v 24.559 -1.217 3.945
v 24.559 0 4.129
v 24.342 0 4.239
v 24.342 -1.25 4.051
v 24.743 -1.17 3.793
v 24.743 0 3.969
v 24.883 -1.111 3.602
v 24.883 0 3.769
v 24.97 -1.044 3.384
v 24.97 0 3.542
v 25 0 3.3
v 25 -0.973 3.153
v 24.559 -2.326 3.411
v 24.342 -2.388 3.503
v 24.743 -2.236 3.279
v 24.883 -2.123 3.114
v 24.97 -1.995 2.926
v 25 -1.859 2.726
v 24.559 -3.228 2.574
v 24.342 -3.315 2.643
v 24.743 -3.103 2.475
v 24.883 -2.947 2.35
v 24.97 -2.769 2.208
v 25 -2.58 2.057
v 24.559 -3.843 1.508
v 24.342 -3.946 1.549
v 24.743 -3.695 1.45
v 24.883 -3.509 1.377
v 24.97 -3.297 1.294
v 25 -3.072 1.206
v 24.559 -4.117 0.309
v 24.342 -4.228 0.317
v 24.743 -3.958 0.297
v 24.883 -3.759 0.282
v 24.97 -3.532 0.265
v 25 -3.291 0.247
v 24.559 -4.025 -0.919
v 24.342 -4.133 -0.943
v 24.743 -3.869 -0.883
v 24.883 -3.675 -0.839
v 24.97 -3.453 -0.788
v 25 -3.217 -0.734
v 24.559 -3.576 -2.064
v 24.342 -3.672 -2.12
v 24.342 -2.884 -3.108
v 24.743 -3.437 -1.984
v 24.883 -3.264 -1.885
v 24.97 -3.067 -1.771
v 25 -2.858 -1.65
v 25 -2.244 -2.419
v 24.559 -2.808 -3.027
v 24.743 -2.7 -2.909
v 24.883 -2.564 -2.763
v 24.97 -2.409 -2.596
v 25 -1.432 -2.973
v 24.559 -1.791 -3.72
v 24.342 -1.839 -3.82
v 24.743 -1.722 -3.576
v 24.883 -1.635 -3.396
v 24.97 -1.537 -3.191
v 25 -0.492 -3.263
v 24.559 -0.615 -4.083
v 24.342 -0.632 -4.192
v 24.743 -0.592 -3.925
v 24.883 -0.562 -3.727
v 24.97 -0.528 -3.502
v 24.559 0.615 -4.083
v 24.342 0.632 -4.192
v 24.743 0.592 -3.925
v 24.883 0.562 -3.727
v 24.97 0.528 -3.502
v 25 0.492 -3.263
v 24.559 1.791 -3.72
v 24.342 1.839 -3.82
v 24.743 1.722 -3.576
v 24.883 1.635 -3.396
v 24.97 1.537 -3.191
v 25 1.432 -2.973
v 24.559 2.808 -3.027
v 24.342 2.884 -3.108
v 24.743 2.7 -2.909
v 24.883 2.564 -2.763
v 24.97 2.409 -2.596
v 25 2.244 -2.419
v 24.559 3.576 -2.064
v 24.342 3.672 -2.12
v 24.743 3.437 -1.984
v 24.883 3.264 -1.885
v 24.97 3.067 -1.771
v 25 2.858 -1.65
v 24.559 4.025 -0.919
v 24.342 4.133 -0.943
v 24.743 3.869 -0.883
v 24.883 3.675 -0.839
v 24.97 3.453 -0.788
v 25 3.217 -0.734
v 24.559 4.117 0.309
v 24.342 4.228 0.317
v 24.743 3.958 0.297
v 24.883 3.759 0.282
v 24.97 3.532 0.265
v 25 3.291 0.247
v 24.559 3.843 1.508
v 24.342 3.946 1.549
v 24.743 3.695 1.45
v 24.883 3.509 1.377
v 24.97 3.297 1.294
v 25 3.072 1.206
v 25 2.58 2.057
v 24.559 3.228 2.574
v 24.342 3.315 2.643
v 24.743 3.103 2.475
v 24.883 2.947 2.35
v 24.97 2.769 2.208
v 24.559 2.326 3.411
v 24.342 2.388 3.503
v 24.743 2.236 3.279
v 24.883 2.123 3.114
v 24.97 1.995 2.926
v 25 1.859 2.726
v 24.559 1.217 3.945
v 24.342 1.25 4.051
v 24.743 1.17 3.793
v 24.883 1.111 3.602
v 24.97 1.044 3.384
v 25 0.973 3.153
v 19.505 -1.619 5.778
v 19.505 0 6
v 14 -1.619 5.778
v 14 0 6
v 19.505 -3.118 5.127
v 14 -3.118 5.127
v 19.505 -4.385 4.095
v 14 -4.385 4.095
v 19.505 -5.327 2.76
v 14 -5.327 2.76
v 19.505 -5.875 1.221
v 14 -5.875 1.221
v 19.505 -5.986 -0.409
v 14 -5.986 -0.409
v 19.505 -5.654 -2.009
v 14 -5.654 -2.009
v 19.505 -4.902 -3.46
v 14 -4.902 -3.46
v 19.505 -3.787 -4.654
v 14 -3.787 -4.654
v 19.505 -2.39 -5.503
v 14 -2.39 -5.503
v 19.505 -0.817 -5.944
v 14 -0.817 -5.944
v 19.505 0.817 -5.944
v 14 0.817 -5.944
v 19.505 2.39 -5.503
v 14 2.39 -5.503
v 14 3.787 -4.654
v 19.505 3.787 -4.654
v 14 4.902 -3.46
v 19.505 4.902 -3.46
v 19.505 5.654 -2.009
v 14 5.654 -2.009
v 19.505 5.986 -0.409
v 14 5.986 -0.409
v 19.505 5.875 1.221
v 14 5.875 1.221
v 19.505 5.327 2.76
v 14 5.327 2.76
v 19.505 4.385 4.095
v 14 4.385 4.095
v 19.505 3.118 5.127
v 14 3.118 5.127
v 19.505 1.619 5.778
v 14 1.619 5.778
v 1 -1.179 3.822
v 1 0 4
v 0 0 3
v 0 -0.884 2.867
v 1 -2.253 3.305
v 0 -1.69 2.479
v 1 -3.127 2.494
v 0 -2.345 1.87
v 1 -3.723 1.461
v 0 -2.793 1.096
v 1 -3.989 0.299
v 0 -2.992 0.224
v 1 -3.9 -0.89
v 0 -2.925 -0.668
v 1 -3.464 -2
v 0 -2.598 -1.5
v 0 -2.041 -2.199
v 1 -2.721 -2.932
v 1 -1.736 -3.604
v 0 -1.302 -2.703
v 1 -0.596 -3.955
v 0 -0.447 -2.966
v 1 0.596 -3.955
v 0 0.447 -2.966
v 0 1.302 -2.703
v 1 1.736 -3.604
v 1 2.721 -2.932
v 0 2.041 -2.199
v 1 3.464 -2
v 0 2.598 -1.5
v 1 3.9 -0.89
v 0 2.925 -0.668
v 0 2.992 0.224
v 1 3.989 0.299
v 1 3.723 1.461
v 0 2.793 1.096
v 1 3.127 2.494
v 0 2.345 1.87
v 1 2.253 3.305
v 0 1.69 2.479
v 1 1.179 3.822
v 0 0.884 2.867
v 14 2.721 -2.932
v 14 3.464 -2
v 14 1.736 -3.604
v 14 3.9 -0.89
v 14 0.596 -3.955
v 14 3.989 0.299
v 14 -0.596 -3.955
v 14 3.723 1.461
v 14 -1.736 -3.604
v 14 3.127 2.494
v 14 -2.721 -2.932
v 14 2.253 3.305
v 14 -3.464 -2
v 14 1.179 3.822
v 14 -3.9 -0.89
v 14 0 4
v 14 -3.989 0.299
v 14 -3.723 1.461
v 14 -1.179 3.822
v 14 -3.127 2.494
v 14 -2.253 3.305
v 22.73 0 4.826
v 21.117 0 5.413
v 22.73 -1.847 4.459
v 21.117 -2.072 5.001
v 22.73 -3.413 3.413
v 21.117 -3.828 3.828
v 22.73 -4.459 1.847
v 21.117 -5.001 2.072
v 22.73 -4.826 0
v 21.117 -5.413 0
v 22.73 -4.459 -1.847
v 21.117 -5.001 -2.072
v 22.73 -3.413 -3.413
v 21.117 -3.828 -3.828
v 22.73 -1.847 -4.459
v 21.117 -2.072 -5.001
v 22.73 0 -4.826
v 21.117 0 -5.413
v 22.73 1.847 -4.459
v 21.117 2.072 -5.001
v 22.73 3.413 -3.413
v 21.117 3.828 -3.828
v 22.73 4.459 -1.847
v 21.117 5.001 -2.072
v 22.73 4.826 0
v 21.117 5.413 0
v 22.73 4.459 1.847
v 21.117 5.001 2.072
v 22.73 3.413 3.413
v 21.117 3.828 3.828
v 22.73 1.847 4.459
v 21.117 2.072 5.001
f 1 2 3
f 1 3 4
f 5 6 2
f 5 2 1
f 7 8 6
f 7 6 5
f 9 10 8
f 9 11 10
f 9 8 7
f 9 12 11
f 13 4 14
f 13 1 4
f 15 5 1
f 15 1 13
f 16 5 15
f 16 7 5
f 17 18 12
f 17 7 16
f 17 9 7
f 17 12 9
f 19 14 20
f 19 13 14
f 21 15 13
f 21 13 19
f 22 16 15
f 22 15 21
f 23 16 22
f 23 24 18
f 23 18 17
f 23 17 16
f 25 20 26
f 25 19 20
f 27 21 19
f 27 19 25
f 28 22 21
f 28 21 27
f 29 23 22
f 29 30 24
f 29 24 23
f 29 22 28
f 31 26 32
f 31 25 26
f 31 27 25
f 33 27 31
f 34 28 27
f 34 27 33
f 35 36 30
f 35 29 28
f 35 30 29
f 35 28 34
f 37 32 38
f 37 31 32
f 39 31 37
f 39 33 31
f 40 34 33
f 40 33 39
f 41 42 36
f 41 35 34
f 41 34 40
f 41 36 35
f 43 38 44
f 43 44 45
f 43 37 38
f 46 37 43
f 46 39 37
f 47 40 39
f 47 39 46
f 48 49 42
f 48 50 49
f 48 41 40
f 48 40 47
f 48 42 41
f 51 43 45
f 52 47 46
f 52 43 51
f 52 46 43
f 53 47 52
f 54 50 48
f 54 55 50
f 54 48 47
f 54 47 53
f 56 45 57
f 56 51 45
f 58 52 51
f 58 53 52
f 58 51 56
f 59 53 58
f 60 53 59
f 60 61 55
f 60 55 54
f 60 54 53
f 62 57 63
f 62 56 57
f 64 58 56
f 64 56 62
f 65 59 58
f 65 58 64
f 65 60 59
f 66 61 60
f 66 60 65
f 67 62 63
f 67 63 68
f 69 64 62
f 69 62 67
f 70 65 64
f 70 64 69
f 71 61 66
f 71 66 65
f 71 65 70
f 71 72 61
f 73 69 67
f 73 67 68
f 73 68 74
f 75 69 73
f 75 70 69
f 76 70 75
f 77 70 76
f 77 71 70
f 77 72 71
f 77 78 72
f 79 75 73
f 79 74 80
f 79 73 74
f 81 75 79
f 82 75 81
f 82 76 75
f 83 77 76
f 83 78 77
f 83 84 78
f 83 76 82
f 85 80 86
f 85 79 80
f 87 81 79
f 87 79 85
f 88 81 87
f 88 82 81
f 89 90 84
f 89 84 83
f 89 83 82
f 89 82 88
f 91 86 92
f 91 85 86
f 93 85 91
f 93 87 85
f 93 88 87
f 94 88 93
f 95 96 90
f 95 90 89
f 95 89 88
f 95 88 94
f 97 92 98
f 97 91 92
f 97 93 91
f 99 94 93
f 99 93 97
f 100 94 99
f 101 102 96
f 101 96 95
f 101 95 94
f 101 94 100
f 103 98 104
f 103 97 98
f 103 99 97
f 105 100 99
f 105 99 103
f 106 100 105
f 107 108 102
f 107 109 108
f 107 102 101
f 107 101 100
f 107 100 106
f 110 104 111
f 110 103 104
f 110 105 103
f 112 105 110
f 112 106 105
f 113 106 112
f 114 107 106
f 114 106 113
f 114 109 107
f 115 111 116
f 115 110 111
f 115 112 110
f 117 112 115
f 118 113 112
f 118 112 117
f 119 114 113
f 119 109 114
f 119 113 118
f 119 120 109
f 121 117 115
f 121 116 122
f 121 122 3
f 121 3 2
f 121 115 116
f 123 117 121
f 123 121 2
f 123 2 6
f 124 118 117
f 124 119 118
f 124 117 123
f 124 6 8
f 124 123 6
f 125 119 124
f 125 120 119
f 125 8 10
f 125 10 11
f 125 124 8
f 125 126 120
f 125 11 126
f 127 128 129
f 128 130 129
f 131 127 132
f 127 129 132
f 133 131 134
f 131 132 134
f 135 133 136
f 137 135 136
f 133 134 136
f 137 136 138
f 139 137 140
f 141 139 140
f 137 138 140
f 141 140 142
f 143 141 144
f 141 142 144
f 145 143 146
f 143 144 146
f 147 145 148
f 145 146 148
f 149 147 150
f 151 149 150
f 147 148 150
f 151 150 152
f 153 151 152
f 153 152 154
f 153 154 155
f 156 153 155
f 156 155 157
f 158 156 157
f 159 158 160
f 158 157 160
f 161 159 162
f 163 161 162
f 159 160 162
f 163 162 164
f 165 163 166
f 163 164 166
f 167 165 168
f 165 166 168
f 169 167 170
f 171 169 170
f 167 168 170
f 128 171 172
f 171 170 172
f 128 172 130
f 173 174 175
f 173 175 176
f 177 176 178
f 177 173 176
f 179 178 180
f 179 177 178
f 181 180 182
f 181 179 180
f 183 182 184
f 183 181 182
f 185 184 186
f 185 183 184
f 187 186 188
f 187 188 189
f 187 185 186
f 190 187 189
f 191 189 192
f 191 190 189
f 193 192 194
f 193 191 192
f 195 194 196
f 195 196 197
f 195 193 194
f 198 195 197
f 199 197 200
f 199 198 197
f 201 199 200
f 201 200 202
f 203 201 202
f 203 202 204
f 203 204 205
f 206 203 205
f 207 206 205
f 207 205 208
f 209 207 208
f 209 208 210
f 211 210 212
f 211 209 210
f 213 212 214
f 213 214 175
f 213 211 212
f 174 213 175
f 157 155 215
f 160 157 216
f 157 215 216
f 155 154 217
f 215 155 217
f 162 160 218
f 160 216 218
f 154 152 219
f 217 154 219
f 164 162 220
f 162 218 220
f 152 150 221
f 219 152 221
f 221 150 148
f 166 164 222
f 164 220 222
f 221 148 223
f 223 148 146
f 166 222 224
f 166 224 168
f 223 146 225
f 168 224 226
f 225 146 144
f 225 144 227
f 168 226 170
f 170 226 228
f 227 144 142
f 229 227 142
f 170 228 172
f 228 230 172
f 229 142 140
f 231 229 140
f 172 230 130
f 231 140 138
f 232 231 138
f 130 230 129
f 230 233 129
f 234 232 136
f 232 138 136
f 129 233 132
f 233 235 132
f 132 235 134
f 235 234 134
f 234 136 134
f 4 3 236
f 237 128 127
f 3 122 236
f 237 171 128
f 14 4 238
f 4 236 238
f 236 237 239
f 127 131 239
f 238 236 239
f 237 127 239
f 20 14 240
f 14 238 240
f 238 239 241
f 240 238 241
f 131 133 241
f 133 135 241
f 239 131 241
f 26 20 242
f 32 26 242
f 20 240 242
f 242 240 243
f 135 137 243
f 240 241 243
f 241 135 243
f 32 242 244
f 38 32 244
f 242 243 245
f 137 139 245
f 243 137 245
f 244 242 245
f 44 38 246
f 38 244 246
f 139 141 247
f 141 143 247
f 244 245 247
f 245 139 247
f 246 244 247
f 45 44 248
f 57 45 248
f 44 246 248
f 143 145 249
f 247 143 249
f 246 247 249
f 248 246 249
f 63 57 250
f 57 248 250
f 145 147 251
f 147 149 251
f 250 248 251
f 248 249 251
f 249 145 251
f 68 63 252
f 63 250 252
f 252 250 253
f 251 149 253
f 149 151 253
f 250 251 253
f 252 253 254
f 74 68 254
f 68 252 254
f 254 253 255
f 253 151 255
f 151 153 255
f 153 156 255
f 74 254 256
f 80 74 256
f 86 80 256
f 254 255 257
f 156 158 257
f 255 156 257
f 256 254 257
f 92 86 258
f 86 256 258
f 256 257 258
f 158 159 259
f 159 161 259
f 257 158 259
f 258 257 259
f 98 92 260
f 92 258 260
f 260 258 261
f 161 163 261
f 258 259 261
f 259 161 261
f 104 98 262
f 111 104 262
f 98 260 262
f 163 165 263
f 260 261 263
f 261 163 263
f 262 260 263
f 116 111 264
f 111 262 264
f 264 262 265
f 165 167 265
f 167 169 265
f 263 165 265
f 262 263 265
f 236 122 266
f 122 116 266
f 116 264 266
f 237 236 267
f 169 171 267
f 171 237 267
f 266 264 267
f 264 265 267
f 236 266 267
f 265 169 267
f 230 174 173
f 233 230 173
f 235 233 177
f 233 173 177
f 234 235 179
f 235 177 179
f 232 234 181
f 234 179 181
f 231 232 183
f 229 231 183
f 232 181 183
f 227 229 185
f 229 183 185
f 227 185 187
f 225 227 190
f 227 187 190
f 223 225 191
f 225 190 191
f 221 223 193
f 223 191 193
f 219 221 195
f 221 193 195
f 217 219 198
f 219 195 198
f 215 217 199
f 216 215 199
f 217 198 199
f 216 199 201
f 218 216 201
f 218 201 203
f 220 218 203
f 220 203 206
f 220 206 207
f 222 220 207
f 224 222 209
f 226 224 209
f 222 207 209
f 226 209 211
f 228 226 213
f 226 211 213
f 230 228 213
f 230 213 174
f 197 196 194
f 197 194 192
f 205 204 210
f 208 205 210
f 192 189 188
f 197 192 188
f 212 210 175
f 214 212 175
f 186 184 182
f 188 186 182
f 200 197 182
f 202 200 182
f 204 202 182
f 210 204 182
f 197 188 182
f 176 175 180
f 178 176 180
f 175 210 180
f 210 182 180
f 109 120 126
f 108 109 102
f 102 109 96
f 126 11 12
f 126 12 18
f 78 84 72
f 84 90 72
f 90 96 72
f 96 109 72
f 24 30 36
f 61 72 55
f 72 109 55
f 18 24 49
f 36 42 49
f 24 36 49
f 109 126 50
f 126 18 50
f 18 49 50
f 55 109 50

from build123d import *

# Parameters (mm, degrees)
F2_SIZE = 1
F3_R    = 1


with BuildPart() as f1:
    # F0 (on Front) → F1 (revolve)
    with BuildSketch(Plane.XZ):
        Polygon((0, 4), (0, 0), (25, 0), (25, 4), (19.505045, 6), (14, 6), (14, 4), align=None)
    revolve(axis=Axis((10.323764, 0, 0), (1, 0, 0)))

    # F2
    f2_edges = [f1.edges().sort_by_distance(p)[0] for p in [
        (0, 0, -4),
    ]]
    chamfer(f2_edges, length=F2_SIZE)

    # F3
    f3_edges = [f1.edges().sort_by_distance(p)[0] for p in [
        (25, 0, -4),
    ]]
    fillet(f3_edges, radius=F3_R)


solid = f1.part
